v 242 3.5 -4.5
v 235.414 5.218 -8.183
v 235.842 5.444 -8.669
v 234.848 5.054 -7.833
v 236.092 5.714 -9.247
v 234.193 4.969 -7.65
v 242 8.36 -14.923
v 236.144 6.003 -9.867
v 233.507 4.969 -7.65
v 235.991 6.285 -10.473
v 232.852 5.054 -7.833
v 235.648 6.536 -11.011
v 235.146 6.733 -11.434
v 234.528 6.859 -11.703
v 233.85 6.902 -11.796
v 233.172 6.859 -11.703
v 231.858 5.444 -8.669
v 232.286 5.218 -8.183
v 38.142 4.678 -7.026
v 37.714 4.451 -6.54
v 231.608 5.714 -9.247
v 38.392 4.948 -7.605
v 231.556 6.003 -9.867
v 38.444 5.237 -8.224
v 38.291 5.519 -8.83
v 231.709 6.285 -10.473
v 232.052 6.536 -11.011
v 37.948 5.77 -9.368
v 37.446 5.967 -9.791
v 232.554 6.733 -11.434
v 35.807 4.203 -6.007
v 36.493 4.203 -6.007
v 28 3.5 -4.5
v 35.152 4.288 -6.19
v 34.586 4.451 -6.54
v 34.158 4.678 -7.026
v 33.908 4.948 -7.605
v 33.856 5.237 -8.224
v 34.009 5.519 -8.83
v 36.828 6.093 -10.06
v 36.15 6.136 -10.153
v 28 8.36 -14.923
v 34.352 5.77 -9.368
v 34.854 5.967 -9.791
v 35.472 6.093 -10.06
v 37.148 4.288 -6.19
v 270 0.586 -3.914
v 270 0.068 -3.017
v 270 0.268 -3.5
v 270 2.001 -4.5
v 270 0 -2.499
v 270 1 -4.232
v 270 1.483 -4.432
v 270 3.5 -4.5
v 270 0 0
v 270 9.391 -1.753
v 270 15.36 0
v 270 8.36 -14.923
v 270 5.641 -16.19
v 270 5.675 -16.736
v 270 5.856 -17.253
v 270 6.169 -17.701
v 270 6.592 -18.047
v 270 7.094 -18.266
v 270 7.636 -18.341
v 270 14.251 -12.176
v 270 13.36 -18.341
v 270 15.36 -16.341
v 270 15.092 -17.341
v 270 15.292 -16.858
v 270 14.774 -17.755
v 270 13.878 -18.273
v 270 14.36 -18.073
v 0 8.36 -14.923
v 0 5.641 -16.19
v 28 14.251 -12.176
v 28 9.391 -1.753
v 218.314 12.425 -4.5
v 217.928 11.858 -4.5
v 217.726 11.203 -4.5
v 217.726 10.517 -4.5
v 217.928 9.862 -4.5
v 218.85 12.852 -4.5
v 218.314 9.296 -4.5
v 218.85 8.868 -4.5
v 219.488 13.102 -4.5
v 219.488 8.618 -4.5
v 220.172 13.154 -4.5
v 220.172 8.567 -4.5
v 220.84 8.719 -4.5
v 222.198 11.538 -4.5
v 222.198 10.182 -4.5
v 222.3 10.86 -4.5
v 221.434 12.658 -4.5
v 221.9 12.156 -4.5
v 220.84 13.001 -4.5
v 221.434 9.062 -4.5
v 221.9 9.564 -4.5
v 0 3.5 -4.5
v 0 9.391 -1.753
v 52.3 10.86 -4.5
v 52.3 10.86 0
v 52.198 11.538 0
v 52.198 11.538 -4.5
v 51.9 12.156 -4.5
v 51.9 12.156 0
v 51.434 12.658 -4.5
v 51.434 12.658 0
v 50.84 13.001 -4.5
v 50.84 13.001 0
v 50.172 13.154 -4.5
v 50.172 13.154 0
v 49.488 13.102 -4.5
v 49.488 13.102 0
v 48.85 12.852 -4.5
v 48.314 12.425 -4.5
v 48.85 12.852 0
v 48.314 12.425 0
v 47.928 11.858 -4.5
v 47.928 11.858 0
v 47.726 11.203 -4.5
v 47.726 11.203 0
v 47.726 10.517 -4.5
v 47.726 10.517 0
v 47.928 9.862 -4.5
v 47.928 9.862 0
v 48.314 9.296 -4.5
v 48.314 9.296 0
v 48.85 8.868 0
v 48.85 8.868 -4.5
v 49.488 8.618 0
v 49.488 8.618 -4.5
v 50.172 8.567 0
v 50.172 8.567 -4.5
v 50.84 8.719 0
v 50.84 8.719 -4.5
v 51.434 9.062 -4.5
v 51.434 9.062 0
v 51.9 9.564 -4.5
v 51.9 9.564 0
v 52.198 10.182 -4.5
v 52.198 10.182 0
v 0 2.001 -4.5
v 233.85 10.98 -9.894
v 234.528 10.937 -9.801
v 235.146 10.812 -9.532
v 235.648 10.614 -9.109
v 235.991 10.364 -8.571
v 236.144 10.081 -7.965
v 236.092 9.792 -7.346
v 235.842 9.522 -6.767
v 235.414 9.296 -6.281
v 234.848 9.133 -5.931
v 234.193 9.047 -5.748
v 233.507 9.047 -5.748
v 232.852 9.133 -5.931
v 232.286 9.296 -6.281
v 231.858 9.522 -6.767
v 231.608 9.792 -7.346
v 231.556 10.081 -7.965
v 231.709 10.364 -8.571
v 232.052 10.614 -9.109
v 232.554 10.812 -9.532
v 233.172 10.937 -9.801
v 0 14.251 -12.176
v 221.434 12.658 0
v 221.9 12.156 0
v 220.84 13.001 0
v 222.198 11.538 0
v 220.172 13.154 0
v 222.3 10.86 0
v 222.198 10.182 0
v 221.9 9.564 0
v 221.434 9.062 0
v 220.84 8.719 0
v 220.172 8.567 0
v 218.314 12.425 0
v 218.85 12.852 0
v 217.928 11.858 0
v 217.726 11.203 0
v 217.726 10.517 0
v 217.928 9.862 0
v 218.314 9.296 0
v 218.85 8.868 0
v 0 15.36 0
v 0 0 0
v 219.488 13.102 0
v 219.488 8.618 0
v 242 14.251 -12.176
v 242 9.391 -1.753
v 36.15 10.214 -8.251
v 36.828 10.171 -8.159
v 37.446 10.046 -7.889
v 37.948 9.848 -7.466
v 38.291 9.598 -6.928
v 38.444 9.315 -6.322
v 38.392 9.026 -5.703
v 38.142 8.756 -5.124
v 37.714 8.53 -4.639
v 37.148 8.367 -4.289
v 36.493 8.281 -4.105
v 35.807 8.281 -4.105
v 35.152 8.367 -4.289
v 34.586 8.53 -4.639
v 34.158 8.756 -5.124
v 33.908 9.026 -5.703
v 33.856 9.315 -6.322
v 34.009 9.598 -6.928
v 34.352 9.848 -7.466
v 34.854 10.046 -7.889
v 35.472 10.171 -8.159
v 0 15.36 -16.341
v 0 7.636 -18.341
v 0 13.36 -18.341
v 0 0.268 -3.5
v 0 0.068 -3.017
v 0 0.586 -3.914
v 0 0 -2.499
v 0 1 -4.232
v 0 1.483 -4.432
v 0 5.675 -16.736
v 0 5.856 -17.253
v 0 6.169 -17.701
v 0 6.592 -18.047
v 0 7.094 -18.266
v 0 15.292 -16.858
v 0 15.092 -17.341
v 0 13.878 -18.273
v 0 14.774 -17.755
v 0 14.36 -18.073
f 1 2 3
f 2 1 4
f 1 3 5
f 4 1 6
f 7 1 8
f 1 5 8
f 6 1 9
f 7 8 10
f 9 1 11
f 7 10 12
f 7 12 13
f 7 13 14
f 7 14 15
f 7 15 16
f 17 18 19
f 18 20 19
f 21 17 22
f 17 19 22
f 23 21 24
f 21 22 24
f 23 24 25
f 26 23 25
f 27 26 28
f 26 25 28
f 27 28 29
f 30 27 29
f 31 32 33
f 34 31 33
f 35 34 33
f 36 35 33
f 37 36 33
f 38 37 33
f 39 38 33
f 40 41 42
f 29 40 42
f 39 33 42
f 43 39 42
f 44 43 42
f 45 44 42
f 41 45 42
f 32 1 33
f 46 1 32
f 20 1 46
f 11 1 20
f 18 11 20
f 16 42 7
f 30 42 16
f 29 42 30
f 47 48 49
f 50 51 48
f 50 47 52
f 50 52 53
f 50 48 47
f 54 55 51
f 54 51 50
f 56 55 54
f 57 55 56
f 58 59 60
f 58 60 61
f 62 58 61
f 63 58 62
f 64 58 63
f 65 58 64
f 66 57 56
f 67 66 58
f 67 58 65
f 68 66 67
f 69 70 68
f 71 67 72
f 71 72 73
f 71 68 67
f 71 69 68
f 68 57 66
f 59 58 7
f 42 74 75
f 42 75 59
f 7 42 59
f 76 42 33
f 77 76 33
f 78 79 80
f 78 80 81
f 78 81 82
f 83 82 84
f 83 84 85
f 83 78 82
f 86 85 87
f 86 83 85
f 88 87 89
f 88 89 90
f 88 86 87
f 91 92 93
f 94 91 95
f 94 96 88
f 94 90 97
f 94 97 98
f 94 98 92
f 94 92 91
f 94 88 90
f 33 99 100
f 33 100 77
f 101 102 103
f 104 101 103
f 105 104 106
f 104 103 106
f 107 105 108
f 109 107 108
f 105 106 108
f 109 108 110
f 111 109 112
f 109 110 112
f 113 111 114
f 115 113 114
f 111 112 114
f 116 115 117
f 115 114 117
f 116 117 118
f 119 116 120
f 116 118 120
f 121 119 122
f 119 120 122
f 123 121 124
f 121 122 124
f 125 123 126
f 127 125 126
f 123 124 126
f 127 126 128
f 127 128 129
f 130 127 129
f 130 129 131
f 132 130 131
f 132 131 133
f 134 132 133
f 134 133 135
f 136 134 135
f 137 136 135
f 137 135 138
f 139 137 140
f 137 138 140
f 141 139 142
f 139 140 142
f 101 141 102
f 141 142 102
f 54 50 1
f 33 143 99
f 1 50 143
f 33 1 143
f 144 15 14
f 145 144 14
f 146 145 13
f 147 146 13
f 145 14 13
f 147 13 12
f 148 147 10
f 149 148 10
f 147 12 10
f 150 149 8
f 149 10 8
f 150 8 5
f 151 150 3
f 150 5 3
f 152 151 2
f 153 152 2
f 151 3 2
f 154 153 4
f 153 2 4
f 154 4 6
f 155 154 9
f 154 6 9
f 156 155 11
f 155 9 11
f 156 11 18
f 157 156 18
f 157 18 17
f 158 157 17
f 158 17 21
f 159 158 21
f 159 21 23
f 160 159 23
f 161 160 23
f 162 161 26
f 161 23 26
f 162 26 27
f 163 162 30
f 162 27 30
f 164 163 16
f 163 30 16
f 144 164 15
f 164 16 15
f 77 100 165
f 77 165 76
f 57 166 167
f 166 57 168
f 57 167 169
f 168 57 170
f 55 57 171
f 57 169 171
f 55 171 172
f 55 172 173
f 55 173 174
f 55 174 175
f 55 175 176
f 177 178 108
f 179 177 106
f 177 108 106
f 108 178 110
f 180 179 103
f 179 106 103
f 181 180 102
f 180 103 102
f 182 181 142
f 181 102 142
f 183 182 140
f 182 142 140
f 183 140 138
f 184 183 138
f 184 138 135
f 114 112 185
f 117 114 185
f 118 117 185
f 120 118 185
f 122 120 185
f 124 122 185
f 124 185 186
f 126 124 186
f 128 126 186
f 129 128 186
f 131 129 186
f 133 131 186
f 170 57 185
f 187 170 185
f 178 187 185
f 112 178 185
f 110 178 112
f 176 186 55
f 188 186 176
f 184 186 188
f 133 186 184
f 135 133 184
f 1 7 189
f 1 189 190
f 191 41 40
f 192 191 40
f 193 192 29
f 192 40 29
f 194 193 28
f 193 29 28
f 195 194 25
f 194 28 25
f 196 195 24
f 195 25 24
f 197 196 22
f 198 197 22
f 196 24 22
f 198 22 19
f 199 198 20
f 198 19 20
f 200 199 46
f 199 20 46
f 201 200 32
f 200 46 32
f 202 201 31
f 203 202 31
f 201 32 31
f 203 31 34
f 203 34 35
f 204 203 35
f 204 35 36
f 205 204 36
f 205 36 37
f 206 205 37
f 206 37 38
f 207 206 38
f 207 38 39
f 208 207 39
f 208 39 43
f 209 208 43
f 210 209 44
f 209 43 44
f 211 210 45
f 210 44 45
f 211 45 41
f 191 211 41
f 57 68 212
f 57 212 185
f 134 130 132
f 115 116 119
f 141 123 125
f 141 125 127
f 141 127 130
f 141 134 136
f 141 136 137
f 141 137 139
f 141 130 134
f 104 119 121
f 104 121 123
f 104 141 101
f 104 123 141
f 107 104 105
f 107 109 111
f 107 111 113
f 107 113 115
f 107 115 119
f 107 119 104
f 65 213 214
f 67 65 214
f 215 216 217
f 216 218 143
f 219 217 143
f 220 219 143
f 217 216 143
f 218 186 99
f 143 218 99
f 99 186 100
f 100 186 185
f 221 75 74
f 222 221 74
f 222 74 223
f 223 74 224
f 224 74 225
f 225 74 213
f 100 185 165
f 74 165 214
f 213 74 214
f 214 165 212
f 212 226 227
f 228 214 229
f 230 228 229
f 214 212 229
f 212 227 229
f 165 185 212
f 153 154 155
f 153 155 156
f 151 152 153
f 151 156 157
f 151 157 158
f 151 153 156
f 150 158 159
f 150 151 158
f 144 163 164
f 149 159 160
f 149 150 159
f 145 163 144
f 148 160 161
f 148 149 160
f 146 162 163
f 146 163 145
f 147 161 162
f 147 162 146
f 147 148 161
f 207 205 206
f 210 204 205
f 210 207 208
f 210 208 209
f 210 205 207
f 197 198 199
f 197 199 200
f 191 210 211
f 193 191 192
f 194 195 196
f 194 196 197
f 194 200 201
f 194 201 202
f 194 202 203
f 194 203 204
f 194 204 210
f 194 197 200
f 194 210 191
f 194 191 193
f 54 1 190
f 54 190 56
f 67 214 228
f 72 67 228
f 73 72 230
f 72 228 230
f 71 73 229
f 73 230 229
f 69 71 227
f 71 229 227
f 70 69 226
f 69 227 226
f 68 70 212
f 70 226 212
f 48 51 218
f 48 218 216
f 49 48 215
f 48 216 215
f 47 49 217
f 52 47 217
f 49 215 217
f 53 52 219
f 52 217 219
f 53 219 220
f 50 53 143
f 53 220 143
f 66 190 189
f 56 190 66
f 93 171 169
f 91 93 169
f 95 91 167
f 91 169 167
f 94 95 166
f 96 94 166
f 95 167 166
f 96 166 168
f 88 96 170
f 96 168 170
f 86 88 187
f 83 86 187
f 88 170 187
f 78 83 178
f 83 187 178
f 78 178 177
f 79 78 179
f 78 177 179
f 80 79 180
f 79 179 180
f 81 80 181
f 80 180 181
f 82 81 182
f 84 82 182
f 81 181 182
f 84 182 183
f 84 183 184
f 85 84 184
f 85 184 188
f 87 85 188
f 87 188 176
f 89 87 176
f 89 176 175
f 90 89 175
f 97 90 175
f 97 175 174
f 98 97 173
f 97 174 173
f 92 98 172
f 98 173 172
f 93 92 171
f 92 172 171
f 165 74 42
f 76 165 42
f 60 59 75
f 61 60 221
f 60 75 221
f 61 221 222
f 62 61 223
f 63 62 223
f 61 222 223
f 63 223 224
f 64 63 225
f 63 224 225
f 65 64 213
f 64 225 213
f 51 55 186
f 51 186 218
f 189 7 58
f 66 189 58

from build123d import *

# Parameters (mm, degrees)
PROFILEBOSS_EXTRUDE1_DEPTH           = 270
SKETCH2_R                            = 2.3
LEDSTRIPMOUNTHOLESCUT_EXTRUDE1_DEPTH = 4.5
SKETCH3_R                            = 2.3
MOUNTINGHOLESCUT_EXTRUDE3_DEPTH      = 4.5
SKETCH4_W                            = 28
SKETCH4_H                            = 11.5
POWERCONNECTORCUT_EXTRUDE4_DEPTH     = 6.5


with BuildPart() as part:
    # Sketch1 → ProfileBoss-Extrude1 (new body)
    with BuildSketch(Plane(origin=(0, 0, 0), x_dir=(0, 0, -1), z_dir=(1, 0, 0))):
        with BuildLine():
            Line((0, 0), (2.499461553, 0))
            ThreePointArc((2.499461553, 0), (3.914055855, 0.585944145), (4.5, 2.000538447))
            Line((4.5, 2.000538447), (4.5, 3.5))
            Line((4.5, 3.5), (14.922539551, 8.36011001))
            Line((14.922539551, 8.36011001), (16.190394336, 5.641186649))
            ThreePointArc((16.190394336, 5.641186649), (17.700753359, 6.16912635), (18.340729536, 7.635528477))
            Line((18.340729536, 7.635528477), (18.340729536, 13.36011001))
            ThreePointArc((18.340729536, 13.36011001), (17.754943098, 14.774323572), (16.340729536, 15.36011001))
            Line((16.340729536, 15.36011001), (0, 15.36011001))
            Line((0, 15.36011001), (0, 0))
        make_face()
    extrude(amount=PROFILEBOSS_EXTRUDE1_DEPTH)

    # Sketch2 → LedStripMountHolesCut-Extrude1 (cut)
    with BuildSketch(Plane(origin=(0, 1.15127832, 0.536849897), x_dir=(1, 0, 0), z_dir=(0, -0.906307787036651, -0.4226182617406973))):
        with Locations(Location((36.15, -9.494933384, 0), (0, 0, 270))):
            Circle(SKETCH2_R)
        with Locations(Location((233.85, -11.307548958, 0), (0, 0, 270))):
            Circle(SKETCH2_R)
    extrude(amount=-LEDSTRIPMOUNTHOLESCUT_EXTRUDE1_DEPTH, mode=Mode.SUBTRACT)

    # Sketch3 → MountingHolesCut-Extrude3 (cut)
    with BuildSketch(Plane.XY):
        with Locations((50, 10.86011001)):
            Circle(SKETCH3_R)
        with Locations((220, 10.86011001)):
            Circle(SKETCH3_R)
    extrude(amount=-MOUNTINGHOLESCUT_EXTRUDE3_DEPTH, mode=Mode.SUBTRACT)

    # Sketch4 → PowerConnectorCut-Extrude4 (cut)
    with BuildSketch(Plane(origin=(0, 1.15127832, 0.536849897), x_dir=(1, 0, 0), z_dir=(0, -0.906307787036651, -0.4226182617406973))):
        with Locations((256, -11.307548958)):
            Rectangle(SKETCH4_W, SKETCH4_H)
        with Locations((14, -11.307548958)):
            Rectangle(SKETCH4_W, SKETCH4_H)
    extrude(amount=-POWERCONNECTORCUT_EXTRUDE4_DEPTH, mode=Mode.SUBTRACT)


solid = part.part
